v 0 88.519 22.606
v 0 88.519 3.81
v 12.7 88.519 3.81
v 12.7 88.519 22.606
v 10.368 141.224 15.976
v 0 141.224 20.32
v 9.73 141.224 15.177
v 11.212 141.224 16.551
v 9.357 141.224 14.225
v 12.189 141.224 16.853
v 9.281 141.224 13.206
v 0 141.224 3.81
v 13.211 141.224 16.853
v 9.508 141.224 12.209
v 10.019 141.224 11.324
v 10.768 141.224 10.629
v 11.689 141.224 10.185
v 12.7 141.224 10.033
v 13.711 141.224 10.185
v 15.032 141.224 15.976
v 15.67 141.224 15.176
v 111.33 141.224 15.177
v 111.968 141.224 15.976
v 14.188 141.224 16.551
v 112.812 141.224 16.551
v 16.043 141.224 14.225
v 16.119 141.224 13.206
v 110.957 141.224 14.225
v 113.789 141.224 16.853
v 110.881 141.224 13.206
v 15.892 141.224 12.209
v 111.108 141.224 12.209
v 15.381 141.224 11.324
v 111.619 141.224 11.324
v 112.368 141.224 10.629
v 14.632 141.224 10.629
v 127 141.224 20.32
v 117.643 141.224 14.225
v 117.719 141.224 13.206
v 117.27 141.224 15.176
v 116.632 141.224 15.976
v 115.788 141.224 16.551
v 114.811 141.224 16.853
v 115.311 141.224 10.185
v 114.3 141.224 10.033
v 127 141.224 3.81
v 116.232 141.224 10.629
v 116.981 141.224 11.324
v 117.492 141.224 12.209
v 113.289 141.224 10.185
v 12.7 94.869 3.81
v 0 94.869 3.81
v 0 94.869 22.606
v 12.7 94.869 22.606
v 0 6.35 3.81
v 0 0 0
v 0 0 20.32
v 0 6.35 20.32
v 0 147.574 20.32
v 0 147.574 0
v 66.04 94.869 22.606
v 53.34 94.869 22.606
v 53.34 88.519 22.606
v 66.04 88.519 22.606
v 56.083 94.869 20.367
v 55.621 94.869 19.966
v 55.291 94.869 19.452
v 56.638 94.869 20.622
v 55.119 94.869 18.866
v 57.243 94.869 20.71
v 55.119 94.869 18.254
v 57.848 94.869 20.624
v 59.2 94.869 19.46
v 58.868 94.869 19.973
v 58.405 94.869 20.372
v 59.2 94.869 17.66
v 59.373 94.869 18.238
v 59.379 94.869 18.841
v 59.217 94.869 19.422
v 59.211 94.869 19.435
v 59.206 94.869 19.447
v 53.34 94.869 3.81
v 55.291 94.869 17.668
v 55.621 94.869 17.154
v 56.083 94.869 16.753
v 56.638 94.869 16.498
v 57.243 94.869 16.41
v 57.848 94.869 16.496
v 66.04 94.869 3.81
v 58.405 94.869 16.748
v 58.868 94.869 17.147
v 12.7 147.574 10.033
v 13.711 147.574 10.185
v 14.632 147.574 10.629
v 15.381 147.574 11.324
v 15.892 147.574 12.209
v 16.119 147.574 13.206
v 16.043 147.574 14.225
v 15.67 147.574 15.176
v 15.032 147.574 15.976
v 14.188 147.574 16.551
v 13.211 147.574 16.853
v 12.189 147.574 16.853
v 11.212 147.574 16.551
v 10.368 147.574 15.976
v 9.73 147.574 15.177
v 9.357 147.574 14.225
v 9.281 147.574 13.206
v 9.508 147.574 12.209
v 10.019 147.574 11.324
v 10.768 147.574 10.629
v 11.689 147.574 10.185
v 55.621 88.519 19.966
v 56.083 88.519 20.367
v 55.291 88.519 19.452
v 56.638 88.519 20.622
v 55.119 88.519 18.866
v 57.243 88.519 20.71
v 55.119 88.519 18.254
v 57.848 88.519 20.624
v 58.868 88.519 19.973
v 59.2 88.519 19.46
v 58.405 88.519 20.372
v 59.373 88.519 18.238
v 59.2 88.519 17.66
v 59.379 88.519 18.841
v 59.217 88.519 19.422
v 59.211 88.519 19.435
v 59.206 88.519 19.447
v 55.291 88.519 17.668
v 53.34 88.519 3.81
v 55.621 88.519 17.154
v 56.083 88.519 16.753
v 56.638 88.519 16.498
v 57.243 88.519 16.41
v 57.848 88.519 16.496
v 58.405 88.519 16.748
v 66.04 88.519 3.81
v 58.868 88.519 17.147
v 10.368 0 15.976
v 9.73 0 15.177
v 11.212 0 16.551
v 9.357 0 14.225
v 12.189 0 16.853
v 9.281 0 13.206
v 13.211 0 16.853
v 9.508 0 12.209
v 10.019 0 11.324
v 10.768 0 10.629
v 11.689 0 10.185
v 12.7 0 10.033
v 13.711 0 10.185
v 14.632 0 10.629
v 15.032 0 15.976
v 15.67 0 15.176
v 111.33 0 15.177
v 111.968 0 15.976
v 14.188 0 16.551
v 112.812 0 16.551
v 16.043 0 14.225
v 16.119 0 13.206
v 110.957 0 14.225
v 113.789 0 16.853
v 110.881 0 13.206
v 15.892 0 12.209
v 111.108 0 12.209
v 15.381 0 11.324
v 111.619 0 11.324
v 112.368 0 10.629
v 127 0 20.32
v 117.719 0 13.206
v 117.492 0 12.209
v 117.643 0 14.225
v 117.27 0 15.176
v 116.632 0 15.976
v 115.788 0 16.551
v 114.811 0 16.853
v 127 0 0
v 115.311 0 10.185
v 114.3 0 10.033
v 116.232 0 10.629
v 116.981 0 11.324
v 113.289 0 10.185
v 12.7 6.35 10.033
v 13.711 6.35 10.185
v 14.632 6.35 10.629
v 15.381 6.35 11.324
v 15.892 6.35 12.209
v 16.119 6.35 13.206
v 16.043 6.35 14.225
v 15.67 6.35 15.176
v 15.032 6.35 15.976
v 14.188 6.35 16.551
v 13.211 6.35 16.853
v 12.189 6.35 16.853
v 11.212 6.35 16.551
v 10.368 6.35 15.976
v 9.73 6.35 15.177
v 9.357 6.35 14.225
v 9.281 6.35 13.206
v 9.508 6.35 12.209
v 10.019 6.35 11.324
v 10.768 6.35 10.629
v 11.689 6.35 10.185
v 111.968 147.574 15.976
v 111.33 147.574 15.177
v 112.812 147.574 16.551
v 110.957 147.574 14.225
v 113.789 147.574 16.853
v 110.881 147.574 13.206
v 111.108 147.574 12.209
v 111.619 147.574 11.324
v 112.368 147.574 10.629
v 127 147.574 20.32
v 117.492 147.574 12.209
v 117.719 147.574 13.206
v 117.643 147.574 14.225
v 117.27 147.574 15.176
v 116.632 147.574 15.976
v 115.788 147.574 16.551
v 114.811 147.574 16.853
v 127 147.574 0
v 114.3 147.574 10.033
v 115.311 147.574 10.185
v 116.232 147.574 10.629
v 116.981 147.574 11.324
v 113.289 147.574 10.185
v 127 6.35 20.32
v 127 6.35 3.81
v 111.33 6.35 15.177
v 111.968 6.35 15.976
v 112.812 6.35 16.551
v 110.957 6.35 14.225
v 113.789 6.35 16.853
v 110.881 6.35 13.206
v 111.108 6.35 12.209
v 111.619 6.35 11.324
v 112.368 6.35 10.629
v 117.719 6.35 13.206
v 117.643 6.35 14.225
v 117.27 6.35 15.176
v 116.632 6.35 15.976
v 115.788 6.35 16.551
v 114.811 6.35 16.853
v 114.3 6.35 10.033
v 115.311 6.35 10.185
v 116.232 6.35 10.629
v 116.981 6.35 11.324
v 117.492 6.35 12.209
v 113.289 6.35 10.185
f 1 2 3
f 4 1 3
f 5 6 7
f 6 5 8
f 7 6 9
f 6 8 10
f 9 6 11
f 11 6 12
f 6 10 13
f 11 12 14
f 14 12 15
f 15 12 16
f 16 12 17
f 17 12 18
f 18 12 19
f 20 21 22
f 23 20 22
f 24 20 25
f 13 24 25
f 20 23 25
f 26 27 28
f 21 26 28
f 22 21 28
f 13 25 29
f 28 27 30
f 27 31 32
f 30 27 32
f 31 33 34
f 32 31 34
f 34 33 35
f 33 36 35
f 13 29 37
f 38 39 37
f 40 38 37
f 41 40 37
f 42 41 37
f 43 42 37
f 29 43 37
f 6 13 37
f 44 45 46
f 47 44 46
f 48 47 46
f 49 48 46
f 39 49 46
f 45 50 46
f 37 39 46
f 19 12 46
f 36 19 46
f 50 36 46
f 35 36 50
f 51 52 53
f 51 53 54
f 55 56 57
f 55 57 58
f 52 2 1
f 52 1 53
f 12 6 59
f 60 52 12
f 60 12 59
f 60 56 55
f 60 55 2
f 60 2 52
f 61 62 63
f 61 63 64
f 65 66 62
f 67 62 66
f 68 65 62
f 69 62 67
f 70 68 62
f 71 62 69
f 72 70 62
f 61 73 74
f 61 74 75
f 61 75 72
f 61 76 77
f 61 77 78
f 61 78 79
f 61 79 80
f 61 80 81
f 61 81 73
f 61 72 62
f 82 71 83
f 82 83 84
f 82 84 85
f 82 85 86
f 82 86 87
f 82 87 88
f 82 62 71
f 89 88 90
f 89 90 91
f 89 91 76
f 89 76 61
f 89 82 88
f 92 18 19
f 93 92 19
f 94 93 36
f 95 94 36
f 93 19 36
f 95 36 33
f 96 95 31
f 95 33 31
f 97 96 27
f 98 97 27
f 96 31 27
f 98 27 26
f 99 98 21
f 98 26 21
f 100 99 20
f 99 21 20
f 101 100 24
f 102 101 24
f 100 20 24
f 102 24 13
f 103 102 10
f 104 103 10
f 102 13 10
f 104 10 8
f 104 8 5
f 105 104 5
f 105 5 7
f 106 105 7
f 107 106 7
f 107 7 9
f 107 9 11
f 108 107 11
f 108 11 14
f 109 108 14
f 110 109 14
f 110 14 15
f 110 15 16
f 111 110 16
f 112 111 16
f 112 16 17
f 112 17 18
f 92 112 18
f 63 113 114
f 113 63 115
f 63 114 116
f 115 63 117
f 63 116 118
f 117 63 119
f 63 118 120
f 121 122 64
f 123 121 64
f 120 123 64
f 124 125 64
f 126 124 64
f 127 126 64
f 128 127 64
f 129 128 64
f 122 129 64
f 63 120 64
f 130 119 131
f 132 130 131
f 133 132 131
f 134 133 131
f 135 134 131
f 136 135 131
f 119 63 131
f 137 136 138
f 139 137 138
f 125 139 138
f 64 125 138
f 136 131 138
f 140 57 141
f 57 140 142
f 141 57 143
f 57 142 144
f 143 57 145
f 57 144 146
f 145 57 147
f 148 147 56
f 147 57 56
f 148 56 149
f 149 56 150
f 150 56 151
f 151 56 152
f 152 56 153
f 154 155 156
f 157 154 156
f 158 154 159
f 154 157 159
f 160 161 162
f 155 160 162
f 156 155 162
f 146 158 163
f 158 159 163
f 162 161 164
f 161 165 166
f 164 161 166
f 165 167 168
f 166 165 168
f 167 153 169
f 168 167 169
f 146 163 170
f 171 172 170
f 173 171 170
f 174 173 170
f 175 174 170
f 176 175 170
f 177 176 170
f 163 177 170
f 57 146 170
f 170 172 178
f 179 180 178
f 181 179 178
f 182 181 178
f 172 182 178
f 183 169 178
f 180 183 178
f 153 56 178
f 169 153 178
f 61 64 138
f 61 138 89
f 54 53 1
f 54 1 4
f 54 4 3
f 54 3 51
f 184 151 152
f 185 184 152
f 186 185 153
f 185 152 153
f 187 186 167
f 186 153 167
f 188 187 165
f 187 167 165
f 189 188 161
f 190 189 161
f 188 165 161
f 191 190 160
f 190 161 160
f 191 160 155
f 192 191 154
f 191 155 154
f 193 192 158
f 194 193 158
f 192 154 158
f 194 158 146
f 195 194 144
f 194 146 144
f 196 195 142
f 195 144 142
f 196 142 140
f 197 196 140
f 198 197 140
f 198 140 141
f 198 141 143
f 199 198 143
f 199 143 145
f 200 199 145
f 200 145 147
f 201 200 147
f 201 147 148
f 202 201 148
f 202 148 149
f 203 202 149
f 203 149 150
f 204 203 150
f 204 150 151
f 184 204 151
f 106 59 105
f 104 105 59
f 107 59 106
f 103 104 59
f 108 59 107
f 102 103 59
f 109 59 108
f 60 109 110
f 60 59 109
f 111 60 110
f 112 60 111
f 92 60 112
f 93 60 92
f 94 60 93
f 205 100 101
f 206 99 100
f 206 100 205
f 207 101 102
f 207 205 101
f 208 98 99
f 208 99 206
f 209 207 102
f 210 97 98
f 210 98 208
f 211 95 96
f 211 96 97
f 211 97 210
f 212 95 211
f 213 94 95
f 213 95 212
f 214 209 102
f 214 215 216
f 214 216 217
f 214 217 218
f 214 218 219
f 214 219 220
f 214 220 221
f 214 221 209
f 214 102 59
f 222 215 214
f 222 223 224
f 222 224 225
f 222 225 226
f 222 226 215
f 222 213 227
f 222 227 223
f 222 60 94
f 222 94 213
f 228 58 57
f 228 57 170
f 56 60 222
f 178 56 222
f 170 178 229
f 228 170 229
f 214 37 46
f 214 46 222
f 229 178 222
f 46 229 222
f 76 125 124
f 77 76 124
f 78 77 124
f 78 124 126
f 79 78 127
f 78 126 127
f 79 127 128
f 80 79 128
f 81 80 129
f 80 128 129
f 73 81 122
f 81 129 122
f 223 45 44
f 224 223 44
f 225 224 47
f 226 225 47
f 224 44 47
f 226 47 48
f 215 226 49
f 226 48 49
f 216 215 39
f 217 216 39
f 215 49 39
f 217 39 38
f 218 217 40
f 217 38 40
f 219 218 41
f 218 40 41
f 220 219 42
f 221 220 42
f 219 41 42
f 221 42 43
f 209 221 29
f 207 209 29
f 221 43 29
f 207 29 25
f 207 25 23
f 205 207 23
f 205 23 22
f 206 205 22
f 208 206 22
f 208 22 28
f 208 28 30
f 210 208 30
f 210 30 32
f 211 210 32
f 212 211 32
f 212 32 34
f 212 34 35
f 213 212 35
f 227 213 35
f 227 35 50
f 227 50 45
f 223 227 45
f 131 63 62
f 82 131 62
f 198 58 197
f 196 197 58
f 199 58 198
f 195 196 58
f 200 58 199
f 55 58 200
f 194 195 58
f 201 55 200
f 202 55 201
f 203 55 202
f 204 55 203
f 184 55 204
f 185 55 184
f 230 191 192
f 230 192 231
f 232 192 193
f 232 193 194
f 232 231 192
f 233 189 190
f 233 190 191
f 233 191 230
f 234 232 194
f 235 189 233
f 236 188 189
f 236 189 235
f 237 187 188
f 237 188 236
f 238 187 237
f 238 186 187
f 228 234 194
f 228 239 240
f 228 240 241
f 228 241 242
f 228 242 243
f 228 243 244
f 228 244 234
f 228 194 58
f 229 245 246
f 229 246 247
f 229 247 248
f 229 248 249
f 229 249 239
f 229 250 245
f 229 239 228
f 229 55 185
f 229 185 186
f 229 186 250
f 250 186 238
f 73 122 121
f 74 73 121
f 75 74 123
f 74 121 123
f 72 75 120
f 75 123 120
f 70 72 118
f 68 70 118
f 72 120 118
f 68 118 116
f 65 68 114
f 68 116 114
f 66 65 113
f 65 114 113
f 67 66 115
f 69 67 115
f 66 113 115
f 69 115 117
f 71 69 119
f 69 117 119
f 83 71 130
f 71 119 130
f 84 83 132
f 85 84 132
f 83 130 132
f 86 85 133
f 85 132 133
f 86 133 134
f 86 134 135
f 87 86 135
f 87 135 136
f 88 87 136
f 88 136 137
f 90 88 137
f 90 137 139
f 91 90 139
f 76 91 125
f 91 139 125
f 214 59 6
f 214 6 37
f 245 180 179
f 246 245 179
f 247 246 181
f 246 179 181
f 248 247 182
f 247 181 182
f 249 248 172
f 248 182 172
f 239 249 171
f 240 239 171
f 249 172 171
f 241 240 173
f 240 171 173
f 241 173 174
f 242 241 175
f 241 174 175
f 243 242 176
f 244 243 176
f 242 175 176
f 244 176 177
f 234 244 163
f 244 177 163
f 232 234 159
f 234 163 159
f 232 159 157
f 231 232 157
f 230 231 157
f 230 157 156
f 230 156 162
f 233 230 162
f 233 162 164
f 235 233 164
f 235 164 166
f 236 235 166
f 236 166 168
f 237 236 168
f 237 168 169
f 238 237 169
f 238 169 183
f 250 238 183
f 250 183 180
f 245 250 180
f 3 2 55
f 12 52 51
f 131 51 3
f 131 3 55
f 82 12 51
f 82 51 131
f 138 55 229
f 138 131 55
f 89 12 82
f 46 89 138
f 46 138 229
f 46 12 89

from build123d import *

# Parameters (mm, degrees)
SKETCH1_W           = 127
SKETCH1_H           = 147.574
BOSS_EXTRUDE1_DEPTH = 3.81
SKETCH3_W           = 127
SKETCH3_H           = 6.35
BOSS_EXTRUDE2_DEPTH = 16.51
SKETCH4_R           = 3.429
CUT_EXTRUDE1_DEPTH  = 196.754917885
SKETCH6_W           = 12.7
SKETCH6_H           = 6.35
BOSS_EXTRUDE3_DEPTH = 18.796
CUT_EXTRUDE4_DEPTH  = 6.35


with BuildPart() as part:
    # Sketch1 → Boss-Extrude1 (new body)
    with BuildSketch(Plane.XY):
        with Locations((63.5, 73.787)):
            Rectangle(SKETCH1_W, SKETCH1_H)
    extrude(amount=BOSS_EXTRUDE1_DEPTH)

    # Sketch3 → Boss-Extrude2 (add)
    with BuildSketch(Plane.XY.offset(3.81)):
        with Locations((63.5, 144.399)):
            Rectangle(SKETCH3_W, SKETCH3_H)
        with Locations((63.5, 3.175)):
            Rectangle(SKETCH3_W, SKETCH3_H)
    extrude(amount=BOSS_EXTRUDE2_DEPTH)

    # Sketch4 → Cut-Extrude1 (cut, through all)
    with BuildSketch(Plane.XZ):
        with Locations(Location((12.7, 13.462, 0), (0, 0, 270))):
            Circle(SKETCH4_R)
        with Locations(Location((114.3, 13.462, 0), (0, 0, 270))):
            Circle(SKETCH4_R)
    extrude(amount=-CUT_EXTRUDE1_DEPTH, mode=Mode.SUBTRACT)

    # Sketch6 → Boss-Extrude3 (add)
    with BuildSketch(Plane.XY.offset(3.81)):
        with Locations((6.35, 91.694)):
            Rectangle(SKETCH6_W, SKETCH6_H)
        with Locations((59.69, 91.694)):
            Rectangle(SKETCH6_W, SKETCH6_H)
    extrude(amount=BOSS_EXTRUDE3_DEPTH)

    # Sketch10 → Cut-Extrude4 (cut)
    with BuildSketch(Plane.XZ.offset(-88.519)):
        with BuildLine():
            ThreePointArc((59.2, 17.66), (59.397338077, 18.539315257), (59.2169552, 19.422264664))
            ThreePointArc((59.2169552, 19.422264664), (59.208568363, 19.441173113), (59.2, 19.46))
            ThreePointArc((59.2, 19.46), (55.097437581, 18.56), (59.2, 17.66))
        make_face()
    extrude(amount=-CUT_EXTRUDE4_DEPTH, mode=Mode.SUBTRACT)


solid = part.part
